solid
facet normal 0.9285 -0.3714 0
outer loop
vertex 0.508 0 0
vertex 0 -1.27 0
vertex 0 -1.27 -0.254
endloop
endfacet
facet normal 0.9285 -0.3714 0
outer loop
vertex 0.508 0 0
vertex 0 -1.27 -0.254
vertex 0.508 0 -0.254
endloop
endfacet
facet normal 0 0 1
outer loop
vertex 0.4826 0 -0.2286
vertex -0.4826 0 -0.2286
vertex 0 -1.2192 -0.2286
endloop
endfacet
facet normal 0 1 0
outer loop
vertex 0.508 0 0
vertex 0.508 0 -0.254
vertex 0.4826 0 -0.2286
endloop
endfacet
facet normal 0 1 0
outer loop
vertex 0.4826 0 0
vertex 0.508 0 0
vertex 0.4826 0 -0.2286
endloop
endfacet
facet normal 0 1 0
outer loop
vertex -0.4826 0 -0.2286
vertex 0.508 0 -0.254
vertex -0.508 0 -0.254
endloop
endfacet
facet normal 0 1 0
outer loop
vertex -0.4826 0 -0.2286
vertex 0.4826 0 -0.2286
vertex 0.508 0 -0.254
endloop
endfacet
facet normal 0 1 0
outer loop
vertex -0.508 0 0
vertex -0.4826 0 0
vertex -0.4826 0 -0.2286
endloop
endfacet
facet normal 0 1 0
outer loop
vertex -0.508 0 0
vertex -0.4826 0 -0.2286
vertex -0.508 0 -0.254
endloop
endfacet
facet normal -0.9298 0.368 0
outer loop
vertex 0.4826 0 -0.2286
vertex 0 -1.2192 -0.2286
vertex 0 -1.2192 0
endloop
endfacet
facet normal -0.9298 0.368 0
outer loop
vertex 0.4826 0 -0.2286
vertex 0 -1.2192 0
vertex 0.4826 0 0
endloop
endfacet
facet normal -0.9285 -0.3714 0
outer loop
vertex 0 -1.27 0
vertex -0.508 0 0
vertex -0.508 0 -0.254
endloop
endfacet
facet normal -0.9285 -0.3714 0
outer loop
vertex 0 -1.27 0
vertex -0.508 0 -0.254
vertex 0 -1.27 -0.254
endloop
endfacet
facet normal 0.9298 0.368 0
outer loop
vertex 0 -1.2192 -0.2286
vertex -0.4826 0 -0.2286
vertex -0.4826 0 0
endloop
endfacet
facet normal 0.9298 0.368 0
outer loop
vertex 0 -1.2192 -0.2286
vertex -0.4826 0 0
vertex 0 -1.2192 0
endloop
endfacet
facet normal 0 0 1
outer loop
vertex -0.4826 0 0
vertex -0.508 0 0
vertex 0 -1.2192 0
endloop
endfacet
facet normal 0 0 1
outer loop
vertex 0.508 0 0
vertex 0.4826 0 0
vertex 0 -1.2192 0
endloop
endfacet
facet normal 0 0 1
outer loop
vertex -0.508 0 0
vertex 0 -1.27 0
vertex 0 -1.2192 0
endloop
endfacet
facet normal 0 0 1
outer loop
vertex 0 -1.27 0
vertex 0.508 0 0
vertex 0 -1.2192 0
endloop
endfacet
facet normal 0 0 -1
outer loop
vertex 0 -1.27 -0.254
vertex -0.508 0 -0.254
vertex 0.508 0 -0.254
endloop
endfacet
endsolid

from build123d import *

# Parameters (mm, degrees)
BOSS_EXTRUDE1_DEPTH = 0.254
CUT_EXTRUDE1_DEPTH  = 0.2794


with BuildPart() as part:
    # Sketch1 → Boss-Extrude1 (new body)
    with BuildSketch(Plane.XY):
        Polygon((-0.508, 0), (0, -1.27), (0.508, 0), align=None)
    extrude(amount=-BOSS_EXTRUDE1_DEPTH)

    # Sketch2 → Cut-Extrude1 (cut)
    with BuildSketch(Plane.XY.offset(-0.2286)):
        Polygon((-0.4826, 0), (0, -1.2192), (0.4826, 0), align=None)
    extrude(amount=CUT_EXTRUDE1_DEPTH, mode=Mode.SUBTRACT)


solid = part.part
